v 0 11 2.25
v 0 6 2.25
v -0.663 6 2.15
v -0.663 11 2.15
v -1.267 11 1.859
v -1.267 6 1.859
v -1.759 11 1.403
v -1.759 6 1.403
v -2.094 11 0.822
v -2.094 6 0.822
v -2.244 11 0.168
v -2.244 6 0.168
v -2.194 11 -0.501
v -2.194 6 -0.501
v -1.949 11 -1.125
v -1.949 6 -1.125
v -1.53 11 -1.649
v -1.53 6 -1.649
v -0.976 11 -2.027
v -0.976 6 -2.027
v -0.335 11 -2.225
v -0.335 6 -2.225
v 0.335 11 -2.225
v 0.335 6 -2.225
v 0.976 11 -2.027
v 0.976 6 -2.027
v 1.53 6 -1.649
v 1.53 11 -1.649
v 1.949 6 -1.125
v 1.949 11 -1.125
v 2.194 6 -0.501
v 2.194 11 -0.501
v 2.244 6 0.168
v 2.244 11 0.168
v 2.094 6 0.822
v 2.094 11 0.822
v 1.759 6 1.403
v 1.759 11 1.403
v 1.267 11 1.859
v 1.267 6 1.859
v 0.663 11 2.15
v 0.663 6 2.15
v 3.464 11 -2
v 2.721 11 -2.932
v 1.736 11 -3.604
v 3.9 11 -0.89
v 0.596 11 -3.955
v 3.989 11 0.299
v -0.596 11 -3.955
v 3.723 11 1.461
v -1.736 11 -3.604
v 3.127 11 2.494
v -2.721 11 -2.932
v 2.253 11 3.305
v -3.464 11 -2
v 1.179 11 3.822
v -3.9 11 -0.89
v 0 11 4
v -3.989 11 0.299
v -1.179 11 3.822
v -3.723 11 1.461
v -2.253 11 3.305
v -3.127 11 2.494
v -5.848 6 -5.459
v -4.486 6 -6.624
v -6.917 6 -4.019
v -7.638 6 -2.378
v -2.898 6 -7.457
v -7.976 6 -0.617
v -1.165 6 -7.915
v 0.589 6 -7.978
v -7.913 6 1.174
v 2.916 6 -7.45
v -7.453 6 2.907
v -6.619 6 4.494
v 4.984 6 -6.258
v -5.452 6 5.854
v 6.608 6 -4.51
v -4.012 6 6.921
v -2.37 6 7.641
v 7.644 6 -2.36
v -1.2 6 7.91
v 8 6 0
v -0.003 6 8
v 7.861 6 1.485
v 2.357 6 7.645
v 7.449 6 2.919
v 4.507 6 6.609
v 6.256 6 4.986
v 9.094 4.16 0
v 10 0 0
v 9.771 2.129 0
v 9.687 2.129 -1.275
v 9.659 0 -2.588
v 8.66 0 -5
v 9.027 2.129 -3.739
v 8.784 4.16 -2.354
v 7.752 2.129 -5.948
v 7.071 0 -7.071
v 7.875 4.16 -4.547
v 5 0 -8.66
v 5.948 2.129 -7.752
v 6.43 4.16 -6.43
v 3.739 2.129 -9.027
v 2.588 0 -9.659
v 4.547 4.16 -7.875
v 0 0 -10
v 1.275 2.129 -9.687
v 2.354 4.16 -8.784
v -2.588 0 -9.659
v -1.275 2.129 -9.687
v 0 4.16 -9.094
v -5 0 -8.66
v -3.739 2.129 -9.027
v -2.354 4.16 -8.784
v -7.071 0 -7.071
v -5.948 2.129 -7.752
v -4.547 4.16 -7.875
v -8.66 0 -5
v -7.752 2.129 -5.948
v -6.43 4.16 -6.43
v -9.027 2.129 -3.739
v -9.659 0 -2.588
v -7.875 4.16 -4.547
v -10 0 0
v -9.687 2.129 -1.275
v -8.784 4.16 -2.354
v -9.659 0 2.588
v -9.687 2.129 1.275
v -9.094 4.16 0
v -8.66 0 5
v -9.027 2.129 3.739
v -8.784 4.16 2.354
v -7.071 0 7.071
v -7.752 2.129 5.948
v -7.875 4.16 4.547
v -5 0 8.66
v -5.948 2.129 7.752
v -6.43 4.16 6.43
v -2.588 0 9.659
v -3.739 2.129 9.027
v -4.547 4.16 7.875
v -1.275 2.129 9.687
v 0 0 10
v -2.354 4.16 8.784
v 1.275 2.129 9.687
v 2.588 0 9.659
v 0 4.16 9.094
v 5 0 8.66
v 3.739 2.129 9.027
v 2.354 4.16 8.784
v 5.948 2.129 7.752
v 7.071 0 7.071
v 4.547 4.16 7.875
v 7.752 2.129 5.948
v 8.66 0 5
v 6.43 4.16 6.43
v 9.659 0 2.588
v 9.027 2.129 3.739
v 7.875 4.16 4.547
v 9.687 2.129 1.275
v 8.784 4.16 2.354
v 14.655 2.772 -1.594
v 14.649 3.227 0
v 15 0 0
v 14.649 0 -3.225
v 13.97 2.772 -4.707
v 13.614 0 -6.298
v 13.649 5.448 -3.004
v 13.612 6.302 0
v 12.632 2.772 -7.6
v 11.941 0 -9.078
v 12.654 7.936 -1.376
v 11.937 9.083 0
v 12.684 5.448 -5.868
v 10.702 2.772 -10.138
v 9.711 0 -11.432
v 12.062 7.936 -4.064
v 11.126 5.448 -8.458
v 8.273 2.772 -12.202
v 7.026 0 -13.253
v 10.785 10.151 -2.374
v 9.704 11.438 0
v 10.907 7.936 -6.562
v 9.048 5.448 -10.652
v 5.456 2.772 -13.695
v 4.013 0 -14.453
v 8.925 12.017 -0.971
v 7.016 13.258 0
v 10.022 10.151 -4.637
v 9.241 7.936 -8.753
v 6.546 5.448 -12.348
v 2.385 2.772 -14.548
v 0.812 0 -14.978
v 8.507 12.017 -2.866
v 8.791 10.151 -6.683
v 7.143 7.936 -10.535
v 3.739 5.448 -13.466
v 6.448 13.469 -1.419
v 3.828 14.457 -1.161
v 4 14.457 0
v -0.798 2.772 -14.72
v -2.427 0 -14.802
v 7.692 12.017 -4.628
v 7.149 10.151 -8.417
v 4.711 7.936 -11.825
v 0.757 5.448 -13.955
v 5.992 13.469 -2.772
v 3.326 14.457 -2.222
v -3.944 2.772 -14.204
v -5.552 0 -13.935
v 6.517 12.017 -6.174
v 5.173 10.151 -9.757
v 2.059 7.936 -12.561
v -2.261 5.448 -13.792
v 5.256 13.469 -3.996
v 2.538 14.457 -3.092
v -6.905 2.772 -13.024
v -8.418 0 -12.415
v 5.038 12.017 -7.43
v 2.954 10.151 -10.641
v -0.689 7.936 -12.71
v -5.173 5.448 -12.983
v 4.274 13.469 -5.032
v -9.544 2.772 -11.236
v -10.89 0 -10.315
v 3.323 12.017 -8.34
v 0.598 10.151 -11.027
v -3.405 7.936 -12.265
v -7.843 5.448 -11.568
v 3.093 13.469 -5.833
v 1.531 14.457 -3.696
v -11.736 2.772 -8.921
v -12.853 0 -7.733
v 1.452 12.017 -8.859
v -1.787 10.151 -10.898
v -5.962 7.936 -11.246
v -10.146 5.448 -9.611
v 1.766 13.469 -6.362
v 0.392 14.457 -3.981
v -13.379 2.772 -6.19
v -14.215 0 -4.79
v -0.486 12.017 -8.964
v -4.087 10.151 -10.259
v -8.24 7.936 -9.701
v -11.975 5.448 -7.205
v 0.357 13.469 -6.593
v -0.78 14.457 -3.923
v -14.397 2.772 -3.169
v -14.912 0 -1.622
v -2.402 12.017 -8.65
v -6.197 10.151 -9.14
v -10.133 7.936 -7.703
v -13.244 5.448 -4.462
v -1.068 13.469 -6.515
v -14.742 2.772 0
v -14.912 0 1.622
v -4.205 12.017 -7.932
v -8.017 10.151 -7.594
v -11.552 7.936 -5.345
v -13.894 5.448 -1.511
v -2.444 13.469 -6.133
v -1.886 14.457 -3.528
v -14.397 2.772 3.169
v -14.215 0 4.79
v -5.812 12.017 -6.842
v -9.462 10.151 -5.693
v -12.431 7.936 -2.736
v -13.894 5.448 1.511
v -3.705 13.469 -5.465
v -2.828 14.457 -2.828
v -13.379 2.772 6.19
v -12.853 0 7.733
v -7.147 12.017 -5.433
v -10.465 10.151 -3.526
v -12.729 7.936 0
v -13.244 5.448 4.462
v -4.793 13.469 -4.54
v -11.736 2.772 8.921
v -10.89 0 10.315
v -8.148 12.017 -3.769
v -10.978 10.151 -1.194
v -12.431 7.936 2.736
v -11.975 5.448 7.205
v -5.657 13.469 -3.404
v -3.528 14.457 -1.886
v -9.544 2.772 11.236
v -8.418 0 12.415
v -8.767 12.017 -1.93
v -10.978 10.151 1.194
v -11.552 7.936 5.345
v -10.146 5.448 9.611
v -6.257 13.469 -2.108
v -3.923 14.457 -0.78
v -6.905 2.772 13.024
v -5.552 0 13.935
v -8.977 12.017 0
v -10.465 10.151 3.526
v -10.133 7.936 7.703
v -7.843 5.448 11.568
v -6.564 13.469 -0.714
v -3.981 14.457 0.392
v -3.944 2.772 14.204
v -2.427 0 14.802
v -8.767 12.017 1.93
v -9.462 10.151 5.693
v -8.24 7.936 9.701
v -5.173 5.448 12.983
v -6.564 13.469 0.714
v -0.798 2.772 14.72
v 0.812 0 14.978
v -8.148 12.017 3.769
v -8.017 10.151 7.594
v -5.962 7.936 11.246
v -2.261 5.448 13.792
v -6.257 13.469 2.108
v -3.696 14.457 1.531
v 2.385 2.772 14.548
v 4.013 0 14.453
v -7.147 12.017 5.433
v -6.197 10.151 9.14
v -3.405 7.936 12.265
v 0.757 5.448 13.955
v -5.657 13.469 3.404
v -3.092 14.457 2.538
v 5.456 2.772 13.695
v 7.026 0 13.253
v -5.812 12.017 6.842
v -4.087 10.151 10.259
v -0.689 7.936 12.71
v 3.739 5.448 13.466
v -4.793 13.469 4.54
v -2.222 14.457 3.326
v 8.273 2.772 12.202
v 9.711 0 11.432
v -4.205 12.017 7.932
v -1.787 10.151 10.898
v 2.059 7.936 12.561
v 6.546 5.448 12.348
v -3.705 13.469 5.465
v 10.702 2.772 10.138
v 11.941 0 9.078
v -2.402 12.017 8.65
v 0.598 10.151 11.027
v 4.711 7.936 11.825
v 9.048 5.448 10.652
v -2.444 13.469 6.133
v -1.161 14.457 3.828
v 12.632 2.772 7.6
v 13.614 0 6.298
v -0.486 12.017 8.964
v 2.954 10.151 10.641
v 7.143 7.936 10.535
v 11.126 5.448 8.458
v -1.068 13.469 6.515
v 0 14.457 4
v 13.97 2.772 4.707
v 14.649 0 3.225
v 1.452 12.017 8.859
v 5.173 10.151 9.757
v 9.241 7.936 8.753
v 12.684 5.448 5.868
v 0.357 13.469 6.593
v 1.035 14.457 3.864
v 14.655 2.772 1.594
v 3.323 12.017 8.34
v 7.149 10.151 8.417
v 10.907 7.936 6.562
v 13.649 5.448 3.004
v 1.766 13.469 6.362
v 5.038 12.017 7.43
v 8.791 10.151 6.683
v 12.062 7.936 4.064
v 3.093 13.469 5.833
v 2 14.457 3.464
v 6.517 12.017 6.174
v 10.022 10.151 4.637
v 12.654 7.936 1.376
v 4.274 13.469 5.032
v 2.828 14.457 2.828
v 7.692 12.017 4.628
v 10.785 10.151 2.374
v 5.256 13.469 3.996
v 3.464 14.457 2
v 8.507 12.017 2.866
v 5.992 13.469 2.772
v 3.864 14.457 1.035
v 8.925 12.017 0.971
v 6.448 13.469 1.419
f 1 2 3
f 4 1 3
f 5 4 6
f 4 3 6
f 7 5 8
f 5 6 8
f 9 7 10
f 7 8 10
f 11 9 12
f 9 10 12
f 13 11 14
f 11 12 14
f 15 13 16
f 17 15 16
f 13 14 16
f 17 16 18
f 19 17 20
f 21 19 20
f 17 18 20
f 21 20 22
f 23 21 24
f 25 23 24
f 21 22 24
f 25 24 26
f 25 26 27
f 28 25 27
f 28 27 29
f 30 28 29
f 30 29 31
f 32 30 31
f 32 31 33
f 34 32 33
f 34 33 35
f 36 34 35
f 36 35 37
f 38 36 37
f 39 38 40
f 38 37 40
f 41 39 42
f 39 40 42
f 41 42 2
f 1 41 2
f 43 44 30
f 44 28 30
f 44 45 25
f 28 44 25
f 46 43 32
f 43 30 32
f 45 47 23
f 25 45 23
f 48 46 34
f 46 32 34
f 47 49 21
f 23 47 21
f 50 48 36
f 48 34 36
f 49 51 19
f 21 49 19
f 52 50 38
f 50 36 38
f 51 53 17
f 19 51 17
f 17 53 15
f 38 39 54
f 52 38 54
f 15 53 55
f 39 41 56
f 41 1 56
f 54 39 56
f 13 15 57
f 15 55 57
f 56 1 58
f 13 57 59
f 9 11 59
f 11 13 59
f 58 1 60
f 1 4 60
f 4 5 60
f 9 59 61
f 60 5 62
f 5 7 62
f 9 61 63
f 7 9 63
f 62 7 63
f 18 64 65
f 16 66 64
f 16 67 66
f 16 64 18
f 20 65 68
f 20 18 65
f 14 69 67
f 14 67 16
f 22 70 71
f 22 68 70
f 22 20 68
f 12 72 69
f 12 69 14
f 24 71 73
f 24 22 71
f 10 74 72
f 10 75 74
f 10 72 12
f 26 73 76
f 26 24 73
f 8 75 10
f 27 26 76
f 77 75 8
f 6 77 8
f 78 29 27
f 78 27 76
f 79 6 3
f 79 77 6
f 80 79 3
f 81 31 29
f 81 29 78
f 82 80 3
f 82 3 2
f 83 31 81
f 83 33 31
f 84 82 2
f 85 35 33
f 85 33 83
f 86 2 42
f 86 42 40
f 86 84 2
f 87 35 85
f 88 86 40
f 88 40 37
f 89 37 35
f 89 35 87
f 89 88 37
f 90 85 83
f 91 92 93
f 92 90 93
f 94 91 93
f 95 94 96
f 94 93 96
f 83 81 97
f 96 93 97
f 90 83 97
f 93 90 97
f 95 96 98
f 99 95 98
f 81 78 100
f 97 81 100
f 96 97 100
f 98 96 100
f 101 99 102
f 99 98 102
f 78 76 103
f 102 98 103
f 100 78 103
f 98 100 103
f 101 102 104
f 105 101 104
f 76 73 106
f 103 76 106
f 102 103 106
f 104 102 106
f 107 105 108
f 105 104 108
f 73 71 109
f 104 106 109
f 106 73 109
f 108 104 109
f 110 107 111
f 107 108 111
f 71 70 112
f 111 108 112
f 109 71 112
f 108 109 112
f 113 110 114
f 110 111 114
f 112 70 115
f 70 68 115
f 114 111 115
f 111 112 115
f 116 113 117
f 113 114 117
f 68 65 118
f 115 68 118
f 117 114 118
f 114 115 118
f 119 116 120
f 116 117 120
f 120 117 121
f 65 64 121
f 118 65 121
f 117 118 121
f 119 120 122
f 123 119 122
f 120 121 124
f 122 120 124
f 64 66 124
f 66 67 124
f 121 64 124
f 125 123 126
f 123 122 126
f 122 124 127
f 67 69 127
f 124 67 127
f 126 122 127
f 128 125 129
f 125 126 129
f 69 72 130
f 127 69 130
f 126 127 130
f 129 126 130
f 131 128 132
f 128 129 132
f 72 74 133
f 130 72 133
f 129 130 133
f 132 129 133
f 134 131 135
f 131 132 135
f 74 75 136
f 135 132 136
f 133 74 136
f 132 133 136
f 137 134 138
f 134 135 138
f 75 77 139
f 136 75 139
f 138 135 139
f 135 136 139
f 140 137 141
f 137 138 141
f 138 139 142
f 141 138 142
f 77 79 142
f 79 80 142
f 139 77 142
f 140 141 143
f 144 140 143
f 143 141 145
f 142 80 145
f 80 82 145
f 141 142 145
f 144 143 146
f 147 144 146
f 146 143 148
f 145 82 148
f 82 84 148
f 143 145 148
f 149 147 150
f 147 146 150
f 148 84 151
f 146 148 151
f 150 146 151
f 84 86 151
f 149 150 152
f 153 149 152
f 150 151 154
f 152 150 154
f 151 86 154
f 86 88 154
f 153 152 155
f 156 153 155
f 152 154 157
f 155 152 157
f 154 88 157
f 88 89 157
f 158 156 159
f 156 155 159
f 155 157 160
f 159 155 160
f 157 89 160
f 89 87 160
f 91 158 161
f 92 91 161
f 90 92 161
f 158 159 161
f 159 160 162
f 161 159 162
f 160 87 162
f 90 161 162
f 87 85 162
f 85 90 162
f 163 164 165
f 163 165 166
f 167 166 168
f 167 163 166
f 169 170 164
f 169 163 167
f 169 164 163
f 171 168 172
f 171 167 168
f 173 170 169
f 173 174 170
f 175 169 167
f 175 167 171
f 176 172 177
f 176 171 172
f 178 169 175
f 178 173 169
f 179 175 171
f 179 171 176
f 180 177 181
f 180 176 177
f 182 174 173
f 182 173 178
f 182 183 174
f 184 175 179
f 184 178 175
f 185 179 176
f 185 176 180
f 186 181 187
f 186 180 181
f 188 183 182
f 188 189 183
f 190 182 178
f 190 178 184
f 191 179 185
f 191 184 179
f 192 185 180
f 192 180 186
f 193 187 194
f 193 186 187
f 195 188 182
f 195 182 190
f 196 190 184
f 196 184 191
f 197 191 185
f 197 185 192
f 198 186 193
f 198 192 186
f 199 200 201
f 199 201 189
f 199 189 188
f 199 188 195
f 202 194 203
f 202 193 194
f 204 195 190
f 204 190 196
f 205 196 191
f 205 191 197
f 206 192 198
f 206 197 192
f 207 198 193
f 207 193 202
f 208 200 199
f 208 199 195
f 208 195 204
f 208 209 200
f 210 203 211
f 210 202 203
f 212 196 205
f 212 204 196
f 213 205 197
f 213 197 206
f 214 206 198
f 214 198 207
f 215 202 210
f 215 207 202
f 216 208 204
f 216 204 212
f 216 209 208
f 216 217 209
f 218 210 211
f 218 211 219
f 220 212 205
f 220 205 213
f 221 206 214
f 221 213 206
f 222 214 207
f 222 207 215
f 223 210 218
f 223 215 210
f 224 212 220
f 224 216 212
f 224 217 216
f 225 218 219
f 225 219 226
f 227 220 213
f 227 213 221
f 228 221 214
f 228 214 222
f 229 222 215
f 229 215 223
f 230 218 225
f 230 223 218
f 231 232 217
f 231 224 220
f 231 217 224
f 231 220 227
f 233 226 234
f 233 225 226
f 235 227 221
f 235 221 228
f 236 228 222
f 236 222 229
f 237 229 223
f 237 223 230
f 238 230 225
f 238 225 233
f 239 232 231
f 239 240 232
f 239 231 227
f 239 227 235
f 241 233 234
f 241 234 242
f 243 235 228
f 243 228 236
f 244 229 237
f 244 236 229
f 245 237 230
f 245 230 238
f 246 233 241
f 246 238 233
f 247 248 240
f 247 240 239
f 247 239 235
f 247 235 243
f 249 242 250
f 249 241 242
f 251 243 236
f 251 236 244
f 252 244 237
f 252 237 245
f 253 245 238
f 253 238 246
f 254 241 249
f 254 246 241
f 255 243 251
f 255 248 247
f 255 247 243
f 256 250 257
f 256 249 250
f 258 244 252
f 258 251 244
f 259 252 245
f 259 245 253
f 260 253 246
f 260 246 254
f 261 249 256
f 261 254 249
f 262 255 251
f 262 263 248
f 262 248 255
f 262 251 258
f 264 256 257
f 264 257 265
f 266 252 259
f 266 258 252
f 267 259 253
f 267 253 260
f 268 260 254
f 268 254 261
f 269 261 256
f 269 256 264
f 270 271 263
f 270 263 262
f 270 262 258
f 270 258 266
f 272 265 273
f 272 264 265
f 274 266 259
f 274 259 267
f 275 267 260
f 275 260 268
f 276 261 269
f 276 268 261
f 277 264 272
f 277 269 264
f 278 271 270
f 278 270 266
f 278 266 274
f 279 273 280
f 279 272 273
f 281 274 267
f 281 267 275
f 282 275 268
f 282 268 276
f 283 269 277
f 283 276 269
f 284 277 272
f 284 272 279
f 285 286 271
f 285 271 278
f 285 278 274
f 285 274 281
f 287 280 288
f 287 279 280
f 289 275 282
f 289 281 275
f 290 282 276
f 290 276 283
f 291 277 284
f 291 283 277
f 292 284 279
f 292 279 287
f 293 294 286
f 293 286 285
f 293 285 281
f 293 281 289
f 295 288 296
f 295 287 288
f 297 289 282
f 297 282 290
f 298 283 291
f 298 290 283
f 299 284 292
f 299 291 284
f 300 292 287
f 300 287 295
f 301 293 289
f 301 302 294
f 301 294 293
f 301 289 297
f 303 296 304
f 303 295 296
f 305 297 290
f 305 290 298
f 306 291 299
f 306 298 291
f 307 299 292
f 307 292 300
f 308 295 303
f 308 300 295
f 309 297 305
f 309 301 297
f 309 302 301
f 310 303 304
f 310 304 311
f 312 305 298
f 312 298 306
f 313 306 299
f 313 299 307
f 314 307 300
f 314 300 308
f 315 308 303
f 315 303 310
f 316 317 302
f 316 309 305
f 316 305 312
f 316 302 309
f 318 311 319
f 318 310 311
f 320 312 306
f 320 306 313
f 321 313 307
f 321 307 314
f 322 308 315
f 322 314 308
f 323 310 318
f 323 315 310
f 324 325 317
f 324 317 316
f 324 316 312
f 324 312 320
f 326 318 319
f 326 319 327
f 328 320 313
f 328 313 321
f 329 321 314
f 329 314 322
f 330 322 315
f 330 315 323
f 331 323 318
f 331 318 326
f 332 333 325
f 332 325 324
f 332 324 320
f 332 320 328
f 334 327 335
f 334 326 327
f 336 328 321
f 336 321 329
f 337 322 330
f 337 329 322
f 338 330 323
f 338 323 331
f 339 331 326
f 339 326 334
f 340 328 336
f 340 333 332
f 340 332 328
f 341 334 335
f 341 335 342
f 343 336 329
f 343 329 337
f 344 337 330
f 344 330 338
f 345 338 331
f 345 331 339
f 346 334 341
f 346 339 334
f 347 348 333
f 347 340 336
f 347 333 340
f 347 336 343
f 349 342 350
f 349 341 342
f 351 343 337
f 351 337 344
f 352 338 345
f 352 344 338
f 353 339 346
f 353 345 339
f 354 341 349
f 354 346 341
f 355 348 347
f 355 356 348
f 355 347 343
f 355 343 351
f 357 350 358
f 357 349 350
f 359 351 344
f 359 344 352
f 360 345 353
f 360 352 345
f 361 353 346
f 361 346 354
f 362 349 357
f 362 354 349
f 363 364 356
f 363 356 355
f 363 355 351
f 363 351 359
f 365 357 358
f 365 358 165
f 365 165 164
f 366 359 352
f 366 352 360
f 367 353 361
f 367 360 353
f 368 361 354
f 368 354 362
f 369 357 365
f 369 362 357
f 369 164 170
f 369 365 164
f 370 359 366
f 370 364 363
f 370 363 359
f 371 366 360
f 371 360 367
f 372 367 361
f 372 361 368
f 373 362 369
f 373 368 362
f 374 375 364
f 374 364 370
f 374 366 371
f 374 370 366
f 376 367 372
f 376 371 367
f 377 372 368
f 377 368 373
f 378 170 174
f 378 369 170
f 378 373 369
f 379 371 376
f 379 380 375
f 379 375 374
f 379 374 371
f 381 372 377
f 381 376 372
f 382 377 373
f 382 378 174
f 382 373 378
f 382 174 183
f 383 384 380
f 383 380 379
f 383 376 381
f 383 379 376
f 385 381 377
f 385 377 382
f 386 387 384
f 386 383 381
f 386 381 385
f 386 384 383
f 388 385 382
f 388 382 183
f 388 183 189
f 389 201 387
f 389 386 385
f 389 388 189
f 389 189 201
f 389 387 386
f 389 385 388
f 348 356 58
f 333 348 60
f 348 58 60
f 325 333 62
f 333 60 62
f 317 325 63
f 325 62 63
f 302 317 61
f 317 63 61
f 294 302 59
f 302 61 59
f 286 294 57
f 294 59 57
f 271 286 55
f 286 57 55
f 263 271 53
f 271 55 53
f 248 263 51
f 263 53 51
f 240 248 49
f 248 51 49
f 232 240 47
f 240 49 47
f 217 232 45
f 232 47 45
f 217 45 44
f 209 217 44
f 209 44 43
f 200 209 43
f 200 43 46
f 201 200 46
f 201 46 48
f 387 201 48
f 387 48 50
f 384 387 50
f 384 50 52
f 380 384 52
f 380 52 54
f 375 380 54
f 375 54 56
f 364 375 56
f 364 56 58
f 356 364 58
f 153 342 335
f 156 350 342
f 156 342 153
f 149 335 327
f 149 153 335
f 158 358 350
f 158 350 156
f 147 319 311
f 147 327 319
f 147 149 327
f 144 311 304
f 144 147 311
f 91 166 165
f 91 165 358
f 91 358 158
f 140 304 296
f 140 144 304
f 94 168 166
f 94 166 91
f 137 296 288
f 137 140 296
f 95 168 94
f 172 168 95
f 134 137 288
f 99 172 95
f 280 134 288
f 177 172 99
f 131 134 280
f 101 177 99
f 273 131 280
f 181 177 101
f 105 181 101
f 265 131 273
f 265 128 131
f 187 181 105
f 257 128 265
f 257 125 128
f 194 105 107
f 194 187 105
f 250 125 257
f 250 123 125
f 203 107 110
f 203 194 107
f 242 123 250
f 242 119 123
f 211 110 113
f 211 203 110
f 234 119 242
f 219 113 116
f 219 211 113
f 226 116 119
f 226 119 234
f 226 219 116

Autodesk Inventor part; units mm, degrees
ref_plane "YZ Plane" through (0, 0, 0) normal (1, 0, 0) x (0, 1, 0)
ref_plane "XY Plane" through (0, 0, 0) normal (0, 0, 1) x (1, 0, 0)
sketch "Sketch1" plane through (0, 0, 0) normal (0, 0, 1) x (1, 0, 0)
  line L0 (0, 0) -> (0, 15)
  line L1 (0, 0) -> (15, 0)
  arc A0 (15, 0) -> (0, 15) centre (0, 0) ccw
  line L2 (0, -3.6213) -> (0, 21.7279) projected
  dimension "d2" = 15
revolve "Revolution1" add sketch "Sketch1" angle 360 about axis through (0, -10, 0) along (0, 1, 0)
ref_plane "Work Plane1" through (0, 15, 0) normal (0, 1, 0) x (-1, 0, 0)
sketch "Sketch2" plane through (0, 15, 0) normal (0, 1, 0) x (-1, 0, 0)
  point P0 (0, 0)
  point P1 (0, 0)
hole "Hole1" at (0, 15, 0) direction (0, -1, 0) diameter 4.5 end through all counterbore diameter 8 counterbore depth 4 clearance for "Socket Head Cap Screw" size "M4" standard "Ansi Metric M Profile"
shell "Shell1" thickness 5 removed faces 1 at (10.5992, 0, 1.287)
sketch "Sketch3" plane through (0, 0, 0) normal (0, -1, 0) x (1, 0, 0)
  circle A0 centre (0, 0) radius 7.25 projected
  circle A1 centre (0, 0) radius 2.25 projected
extrude "Extrusion1" cut sketch "Sketch3" against normal blind 6
properties part number "Ball_Upper Half" material "Nylon 6/6"
